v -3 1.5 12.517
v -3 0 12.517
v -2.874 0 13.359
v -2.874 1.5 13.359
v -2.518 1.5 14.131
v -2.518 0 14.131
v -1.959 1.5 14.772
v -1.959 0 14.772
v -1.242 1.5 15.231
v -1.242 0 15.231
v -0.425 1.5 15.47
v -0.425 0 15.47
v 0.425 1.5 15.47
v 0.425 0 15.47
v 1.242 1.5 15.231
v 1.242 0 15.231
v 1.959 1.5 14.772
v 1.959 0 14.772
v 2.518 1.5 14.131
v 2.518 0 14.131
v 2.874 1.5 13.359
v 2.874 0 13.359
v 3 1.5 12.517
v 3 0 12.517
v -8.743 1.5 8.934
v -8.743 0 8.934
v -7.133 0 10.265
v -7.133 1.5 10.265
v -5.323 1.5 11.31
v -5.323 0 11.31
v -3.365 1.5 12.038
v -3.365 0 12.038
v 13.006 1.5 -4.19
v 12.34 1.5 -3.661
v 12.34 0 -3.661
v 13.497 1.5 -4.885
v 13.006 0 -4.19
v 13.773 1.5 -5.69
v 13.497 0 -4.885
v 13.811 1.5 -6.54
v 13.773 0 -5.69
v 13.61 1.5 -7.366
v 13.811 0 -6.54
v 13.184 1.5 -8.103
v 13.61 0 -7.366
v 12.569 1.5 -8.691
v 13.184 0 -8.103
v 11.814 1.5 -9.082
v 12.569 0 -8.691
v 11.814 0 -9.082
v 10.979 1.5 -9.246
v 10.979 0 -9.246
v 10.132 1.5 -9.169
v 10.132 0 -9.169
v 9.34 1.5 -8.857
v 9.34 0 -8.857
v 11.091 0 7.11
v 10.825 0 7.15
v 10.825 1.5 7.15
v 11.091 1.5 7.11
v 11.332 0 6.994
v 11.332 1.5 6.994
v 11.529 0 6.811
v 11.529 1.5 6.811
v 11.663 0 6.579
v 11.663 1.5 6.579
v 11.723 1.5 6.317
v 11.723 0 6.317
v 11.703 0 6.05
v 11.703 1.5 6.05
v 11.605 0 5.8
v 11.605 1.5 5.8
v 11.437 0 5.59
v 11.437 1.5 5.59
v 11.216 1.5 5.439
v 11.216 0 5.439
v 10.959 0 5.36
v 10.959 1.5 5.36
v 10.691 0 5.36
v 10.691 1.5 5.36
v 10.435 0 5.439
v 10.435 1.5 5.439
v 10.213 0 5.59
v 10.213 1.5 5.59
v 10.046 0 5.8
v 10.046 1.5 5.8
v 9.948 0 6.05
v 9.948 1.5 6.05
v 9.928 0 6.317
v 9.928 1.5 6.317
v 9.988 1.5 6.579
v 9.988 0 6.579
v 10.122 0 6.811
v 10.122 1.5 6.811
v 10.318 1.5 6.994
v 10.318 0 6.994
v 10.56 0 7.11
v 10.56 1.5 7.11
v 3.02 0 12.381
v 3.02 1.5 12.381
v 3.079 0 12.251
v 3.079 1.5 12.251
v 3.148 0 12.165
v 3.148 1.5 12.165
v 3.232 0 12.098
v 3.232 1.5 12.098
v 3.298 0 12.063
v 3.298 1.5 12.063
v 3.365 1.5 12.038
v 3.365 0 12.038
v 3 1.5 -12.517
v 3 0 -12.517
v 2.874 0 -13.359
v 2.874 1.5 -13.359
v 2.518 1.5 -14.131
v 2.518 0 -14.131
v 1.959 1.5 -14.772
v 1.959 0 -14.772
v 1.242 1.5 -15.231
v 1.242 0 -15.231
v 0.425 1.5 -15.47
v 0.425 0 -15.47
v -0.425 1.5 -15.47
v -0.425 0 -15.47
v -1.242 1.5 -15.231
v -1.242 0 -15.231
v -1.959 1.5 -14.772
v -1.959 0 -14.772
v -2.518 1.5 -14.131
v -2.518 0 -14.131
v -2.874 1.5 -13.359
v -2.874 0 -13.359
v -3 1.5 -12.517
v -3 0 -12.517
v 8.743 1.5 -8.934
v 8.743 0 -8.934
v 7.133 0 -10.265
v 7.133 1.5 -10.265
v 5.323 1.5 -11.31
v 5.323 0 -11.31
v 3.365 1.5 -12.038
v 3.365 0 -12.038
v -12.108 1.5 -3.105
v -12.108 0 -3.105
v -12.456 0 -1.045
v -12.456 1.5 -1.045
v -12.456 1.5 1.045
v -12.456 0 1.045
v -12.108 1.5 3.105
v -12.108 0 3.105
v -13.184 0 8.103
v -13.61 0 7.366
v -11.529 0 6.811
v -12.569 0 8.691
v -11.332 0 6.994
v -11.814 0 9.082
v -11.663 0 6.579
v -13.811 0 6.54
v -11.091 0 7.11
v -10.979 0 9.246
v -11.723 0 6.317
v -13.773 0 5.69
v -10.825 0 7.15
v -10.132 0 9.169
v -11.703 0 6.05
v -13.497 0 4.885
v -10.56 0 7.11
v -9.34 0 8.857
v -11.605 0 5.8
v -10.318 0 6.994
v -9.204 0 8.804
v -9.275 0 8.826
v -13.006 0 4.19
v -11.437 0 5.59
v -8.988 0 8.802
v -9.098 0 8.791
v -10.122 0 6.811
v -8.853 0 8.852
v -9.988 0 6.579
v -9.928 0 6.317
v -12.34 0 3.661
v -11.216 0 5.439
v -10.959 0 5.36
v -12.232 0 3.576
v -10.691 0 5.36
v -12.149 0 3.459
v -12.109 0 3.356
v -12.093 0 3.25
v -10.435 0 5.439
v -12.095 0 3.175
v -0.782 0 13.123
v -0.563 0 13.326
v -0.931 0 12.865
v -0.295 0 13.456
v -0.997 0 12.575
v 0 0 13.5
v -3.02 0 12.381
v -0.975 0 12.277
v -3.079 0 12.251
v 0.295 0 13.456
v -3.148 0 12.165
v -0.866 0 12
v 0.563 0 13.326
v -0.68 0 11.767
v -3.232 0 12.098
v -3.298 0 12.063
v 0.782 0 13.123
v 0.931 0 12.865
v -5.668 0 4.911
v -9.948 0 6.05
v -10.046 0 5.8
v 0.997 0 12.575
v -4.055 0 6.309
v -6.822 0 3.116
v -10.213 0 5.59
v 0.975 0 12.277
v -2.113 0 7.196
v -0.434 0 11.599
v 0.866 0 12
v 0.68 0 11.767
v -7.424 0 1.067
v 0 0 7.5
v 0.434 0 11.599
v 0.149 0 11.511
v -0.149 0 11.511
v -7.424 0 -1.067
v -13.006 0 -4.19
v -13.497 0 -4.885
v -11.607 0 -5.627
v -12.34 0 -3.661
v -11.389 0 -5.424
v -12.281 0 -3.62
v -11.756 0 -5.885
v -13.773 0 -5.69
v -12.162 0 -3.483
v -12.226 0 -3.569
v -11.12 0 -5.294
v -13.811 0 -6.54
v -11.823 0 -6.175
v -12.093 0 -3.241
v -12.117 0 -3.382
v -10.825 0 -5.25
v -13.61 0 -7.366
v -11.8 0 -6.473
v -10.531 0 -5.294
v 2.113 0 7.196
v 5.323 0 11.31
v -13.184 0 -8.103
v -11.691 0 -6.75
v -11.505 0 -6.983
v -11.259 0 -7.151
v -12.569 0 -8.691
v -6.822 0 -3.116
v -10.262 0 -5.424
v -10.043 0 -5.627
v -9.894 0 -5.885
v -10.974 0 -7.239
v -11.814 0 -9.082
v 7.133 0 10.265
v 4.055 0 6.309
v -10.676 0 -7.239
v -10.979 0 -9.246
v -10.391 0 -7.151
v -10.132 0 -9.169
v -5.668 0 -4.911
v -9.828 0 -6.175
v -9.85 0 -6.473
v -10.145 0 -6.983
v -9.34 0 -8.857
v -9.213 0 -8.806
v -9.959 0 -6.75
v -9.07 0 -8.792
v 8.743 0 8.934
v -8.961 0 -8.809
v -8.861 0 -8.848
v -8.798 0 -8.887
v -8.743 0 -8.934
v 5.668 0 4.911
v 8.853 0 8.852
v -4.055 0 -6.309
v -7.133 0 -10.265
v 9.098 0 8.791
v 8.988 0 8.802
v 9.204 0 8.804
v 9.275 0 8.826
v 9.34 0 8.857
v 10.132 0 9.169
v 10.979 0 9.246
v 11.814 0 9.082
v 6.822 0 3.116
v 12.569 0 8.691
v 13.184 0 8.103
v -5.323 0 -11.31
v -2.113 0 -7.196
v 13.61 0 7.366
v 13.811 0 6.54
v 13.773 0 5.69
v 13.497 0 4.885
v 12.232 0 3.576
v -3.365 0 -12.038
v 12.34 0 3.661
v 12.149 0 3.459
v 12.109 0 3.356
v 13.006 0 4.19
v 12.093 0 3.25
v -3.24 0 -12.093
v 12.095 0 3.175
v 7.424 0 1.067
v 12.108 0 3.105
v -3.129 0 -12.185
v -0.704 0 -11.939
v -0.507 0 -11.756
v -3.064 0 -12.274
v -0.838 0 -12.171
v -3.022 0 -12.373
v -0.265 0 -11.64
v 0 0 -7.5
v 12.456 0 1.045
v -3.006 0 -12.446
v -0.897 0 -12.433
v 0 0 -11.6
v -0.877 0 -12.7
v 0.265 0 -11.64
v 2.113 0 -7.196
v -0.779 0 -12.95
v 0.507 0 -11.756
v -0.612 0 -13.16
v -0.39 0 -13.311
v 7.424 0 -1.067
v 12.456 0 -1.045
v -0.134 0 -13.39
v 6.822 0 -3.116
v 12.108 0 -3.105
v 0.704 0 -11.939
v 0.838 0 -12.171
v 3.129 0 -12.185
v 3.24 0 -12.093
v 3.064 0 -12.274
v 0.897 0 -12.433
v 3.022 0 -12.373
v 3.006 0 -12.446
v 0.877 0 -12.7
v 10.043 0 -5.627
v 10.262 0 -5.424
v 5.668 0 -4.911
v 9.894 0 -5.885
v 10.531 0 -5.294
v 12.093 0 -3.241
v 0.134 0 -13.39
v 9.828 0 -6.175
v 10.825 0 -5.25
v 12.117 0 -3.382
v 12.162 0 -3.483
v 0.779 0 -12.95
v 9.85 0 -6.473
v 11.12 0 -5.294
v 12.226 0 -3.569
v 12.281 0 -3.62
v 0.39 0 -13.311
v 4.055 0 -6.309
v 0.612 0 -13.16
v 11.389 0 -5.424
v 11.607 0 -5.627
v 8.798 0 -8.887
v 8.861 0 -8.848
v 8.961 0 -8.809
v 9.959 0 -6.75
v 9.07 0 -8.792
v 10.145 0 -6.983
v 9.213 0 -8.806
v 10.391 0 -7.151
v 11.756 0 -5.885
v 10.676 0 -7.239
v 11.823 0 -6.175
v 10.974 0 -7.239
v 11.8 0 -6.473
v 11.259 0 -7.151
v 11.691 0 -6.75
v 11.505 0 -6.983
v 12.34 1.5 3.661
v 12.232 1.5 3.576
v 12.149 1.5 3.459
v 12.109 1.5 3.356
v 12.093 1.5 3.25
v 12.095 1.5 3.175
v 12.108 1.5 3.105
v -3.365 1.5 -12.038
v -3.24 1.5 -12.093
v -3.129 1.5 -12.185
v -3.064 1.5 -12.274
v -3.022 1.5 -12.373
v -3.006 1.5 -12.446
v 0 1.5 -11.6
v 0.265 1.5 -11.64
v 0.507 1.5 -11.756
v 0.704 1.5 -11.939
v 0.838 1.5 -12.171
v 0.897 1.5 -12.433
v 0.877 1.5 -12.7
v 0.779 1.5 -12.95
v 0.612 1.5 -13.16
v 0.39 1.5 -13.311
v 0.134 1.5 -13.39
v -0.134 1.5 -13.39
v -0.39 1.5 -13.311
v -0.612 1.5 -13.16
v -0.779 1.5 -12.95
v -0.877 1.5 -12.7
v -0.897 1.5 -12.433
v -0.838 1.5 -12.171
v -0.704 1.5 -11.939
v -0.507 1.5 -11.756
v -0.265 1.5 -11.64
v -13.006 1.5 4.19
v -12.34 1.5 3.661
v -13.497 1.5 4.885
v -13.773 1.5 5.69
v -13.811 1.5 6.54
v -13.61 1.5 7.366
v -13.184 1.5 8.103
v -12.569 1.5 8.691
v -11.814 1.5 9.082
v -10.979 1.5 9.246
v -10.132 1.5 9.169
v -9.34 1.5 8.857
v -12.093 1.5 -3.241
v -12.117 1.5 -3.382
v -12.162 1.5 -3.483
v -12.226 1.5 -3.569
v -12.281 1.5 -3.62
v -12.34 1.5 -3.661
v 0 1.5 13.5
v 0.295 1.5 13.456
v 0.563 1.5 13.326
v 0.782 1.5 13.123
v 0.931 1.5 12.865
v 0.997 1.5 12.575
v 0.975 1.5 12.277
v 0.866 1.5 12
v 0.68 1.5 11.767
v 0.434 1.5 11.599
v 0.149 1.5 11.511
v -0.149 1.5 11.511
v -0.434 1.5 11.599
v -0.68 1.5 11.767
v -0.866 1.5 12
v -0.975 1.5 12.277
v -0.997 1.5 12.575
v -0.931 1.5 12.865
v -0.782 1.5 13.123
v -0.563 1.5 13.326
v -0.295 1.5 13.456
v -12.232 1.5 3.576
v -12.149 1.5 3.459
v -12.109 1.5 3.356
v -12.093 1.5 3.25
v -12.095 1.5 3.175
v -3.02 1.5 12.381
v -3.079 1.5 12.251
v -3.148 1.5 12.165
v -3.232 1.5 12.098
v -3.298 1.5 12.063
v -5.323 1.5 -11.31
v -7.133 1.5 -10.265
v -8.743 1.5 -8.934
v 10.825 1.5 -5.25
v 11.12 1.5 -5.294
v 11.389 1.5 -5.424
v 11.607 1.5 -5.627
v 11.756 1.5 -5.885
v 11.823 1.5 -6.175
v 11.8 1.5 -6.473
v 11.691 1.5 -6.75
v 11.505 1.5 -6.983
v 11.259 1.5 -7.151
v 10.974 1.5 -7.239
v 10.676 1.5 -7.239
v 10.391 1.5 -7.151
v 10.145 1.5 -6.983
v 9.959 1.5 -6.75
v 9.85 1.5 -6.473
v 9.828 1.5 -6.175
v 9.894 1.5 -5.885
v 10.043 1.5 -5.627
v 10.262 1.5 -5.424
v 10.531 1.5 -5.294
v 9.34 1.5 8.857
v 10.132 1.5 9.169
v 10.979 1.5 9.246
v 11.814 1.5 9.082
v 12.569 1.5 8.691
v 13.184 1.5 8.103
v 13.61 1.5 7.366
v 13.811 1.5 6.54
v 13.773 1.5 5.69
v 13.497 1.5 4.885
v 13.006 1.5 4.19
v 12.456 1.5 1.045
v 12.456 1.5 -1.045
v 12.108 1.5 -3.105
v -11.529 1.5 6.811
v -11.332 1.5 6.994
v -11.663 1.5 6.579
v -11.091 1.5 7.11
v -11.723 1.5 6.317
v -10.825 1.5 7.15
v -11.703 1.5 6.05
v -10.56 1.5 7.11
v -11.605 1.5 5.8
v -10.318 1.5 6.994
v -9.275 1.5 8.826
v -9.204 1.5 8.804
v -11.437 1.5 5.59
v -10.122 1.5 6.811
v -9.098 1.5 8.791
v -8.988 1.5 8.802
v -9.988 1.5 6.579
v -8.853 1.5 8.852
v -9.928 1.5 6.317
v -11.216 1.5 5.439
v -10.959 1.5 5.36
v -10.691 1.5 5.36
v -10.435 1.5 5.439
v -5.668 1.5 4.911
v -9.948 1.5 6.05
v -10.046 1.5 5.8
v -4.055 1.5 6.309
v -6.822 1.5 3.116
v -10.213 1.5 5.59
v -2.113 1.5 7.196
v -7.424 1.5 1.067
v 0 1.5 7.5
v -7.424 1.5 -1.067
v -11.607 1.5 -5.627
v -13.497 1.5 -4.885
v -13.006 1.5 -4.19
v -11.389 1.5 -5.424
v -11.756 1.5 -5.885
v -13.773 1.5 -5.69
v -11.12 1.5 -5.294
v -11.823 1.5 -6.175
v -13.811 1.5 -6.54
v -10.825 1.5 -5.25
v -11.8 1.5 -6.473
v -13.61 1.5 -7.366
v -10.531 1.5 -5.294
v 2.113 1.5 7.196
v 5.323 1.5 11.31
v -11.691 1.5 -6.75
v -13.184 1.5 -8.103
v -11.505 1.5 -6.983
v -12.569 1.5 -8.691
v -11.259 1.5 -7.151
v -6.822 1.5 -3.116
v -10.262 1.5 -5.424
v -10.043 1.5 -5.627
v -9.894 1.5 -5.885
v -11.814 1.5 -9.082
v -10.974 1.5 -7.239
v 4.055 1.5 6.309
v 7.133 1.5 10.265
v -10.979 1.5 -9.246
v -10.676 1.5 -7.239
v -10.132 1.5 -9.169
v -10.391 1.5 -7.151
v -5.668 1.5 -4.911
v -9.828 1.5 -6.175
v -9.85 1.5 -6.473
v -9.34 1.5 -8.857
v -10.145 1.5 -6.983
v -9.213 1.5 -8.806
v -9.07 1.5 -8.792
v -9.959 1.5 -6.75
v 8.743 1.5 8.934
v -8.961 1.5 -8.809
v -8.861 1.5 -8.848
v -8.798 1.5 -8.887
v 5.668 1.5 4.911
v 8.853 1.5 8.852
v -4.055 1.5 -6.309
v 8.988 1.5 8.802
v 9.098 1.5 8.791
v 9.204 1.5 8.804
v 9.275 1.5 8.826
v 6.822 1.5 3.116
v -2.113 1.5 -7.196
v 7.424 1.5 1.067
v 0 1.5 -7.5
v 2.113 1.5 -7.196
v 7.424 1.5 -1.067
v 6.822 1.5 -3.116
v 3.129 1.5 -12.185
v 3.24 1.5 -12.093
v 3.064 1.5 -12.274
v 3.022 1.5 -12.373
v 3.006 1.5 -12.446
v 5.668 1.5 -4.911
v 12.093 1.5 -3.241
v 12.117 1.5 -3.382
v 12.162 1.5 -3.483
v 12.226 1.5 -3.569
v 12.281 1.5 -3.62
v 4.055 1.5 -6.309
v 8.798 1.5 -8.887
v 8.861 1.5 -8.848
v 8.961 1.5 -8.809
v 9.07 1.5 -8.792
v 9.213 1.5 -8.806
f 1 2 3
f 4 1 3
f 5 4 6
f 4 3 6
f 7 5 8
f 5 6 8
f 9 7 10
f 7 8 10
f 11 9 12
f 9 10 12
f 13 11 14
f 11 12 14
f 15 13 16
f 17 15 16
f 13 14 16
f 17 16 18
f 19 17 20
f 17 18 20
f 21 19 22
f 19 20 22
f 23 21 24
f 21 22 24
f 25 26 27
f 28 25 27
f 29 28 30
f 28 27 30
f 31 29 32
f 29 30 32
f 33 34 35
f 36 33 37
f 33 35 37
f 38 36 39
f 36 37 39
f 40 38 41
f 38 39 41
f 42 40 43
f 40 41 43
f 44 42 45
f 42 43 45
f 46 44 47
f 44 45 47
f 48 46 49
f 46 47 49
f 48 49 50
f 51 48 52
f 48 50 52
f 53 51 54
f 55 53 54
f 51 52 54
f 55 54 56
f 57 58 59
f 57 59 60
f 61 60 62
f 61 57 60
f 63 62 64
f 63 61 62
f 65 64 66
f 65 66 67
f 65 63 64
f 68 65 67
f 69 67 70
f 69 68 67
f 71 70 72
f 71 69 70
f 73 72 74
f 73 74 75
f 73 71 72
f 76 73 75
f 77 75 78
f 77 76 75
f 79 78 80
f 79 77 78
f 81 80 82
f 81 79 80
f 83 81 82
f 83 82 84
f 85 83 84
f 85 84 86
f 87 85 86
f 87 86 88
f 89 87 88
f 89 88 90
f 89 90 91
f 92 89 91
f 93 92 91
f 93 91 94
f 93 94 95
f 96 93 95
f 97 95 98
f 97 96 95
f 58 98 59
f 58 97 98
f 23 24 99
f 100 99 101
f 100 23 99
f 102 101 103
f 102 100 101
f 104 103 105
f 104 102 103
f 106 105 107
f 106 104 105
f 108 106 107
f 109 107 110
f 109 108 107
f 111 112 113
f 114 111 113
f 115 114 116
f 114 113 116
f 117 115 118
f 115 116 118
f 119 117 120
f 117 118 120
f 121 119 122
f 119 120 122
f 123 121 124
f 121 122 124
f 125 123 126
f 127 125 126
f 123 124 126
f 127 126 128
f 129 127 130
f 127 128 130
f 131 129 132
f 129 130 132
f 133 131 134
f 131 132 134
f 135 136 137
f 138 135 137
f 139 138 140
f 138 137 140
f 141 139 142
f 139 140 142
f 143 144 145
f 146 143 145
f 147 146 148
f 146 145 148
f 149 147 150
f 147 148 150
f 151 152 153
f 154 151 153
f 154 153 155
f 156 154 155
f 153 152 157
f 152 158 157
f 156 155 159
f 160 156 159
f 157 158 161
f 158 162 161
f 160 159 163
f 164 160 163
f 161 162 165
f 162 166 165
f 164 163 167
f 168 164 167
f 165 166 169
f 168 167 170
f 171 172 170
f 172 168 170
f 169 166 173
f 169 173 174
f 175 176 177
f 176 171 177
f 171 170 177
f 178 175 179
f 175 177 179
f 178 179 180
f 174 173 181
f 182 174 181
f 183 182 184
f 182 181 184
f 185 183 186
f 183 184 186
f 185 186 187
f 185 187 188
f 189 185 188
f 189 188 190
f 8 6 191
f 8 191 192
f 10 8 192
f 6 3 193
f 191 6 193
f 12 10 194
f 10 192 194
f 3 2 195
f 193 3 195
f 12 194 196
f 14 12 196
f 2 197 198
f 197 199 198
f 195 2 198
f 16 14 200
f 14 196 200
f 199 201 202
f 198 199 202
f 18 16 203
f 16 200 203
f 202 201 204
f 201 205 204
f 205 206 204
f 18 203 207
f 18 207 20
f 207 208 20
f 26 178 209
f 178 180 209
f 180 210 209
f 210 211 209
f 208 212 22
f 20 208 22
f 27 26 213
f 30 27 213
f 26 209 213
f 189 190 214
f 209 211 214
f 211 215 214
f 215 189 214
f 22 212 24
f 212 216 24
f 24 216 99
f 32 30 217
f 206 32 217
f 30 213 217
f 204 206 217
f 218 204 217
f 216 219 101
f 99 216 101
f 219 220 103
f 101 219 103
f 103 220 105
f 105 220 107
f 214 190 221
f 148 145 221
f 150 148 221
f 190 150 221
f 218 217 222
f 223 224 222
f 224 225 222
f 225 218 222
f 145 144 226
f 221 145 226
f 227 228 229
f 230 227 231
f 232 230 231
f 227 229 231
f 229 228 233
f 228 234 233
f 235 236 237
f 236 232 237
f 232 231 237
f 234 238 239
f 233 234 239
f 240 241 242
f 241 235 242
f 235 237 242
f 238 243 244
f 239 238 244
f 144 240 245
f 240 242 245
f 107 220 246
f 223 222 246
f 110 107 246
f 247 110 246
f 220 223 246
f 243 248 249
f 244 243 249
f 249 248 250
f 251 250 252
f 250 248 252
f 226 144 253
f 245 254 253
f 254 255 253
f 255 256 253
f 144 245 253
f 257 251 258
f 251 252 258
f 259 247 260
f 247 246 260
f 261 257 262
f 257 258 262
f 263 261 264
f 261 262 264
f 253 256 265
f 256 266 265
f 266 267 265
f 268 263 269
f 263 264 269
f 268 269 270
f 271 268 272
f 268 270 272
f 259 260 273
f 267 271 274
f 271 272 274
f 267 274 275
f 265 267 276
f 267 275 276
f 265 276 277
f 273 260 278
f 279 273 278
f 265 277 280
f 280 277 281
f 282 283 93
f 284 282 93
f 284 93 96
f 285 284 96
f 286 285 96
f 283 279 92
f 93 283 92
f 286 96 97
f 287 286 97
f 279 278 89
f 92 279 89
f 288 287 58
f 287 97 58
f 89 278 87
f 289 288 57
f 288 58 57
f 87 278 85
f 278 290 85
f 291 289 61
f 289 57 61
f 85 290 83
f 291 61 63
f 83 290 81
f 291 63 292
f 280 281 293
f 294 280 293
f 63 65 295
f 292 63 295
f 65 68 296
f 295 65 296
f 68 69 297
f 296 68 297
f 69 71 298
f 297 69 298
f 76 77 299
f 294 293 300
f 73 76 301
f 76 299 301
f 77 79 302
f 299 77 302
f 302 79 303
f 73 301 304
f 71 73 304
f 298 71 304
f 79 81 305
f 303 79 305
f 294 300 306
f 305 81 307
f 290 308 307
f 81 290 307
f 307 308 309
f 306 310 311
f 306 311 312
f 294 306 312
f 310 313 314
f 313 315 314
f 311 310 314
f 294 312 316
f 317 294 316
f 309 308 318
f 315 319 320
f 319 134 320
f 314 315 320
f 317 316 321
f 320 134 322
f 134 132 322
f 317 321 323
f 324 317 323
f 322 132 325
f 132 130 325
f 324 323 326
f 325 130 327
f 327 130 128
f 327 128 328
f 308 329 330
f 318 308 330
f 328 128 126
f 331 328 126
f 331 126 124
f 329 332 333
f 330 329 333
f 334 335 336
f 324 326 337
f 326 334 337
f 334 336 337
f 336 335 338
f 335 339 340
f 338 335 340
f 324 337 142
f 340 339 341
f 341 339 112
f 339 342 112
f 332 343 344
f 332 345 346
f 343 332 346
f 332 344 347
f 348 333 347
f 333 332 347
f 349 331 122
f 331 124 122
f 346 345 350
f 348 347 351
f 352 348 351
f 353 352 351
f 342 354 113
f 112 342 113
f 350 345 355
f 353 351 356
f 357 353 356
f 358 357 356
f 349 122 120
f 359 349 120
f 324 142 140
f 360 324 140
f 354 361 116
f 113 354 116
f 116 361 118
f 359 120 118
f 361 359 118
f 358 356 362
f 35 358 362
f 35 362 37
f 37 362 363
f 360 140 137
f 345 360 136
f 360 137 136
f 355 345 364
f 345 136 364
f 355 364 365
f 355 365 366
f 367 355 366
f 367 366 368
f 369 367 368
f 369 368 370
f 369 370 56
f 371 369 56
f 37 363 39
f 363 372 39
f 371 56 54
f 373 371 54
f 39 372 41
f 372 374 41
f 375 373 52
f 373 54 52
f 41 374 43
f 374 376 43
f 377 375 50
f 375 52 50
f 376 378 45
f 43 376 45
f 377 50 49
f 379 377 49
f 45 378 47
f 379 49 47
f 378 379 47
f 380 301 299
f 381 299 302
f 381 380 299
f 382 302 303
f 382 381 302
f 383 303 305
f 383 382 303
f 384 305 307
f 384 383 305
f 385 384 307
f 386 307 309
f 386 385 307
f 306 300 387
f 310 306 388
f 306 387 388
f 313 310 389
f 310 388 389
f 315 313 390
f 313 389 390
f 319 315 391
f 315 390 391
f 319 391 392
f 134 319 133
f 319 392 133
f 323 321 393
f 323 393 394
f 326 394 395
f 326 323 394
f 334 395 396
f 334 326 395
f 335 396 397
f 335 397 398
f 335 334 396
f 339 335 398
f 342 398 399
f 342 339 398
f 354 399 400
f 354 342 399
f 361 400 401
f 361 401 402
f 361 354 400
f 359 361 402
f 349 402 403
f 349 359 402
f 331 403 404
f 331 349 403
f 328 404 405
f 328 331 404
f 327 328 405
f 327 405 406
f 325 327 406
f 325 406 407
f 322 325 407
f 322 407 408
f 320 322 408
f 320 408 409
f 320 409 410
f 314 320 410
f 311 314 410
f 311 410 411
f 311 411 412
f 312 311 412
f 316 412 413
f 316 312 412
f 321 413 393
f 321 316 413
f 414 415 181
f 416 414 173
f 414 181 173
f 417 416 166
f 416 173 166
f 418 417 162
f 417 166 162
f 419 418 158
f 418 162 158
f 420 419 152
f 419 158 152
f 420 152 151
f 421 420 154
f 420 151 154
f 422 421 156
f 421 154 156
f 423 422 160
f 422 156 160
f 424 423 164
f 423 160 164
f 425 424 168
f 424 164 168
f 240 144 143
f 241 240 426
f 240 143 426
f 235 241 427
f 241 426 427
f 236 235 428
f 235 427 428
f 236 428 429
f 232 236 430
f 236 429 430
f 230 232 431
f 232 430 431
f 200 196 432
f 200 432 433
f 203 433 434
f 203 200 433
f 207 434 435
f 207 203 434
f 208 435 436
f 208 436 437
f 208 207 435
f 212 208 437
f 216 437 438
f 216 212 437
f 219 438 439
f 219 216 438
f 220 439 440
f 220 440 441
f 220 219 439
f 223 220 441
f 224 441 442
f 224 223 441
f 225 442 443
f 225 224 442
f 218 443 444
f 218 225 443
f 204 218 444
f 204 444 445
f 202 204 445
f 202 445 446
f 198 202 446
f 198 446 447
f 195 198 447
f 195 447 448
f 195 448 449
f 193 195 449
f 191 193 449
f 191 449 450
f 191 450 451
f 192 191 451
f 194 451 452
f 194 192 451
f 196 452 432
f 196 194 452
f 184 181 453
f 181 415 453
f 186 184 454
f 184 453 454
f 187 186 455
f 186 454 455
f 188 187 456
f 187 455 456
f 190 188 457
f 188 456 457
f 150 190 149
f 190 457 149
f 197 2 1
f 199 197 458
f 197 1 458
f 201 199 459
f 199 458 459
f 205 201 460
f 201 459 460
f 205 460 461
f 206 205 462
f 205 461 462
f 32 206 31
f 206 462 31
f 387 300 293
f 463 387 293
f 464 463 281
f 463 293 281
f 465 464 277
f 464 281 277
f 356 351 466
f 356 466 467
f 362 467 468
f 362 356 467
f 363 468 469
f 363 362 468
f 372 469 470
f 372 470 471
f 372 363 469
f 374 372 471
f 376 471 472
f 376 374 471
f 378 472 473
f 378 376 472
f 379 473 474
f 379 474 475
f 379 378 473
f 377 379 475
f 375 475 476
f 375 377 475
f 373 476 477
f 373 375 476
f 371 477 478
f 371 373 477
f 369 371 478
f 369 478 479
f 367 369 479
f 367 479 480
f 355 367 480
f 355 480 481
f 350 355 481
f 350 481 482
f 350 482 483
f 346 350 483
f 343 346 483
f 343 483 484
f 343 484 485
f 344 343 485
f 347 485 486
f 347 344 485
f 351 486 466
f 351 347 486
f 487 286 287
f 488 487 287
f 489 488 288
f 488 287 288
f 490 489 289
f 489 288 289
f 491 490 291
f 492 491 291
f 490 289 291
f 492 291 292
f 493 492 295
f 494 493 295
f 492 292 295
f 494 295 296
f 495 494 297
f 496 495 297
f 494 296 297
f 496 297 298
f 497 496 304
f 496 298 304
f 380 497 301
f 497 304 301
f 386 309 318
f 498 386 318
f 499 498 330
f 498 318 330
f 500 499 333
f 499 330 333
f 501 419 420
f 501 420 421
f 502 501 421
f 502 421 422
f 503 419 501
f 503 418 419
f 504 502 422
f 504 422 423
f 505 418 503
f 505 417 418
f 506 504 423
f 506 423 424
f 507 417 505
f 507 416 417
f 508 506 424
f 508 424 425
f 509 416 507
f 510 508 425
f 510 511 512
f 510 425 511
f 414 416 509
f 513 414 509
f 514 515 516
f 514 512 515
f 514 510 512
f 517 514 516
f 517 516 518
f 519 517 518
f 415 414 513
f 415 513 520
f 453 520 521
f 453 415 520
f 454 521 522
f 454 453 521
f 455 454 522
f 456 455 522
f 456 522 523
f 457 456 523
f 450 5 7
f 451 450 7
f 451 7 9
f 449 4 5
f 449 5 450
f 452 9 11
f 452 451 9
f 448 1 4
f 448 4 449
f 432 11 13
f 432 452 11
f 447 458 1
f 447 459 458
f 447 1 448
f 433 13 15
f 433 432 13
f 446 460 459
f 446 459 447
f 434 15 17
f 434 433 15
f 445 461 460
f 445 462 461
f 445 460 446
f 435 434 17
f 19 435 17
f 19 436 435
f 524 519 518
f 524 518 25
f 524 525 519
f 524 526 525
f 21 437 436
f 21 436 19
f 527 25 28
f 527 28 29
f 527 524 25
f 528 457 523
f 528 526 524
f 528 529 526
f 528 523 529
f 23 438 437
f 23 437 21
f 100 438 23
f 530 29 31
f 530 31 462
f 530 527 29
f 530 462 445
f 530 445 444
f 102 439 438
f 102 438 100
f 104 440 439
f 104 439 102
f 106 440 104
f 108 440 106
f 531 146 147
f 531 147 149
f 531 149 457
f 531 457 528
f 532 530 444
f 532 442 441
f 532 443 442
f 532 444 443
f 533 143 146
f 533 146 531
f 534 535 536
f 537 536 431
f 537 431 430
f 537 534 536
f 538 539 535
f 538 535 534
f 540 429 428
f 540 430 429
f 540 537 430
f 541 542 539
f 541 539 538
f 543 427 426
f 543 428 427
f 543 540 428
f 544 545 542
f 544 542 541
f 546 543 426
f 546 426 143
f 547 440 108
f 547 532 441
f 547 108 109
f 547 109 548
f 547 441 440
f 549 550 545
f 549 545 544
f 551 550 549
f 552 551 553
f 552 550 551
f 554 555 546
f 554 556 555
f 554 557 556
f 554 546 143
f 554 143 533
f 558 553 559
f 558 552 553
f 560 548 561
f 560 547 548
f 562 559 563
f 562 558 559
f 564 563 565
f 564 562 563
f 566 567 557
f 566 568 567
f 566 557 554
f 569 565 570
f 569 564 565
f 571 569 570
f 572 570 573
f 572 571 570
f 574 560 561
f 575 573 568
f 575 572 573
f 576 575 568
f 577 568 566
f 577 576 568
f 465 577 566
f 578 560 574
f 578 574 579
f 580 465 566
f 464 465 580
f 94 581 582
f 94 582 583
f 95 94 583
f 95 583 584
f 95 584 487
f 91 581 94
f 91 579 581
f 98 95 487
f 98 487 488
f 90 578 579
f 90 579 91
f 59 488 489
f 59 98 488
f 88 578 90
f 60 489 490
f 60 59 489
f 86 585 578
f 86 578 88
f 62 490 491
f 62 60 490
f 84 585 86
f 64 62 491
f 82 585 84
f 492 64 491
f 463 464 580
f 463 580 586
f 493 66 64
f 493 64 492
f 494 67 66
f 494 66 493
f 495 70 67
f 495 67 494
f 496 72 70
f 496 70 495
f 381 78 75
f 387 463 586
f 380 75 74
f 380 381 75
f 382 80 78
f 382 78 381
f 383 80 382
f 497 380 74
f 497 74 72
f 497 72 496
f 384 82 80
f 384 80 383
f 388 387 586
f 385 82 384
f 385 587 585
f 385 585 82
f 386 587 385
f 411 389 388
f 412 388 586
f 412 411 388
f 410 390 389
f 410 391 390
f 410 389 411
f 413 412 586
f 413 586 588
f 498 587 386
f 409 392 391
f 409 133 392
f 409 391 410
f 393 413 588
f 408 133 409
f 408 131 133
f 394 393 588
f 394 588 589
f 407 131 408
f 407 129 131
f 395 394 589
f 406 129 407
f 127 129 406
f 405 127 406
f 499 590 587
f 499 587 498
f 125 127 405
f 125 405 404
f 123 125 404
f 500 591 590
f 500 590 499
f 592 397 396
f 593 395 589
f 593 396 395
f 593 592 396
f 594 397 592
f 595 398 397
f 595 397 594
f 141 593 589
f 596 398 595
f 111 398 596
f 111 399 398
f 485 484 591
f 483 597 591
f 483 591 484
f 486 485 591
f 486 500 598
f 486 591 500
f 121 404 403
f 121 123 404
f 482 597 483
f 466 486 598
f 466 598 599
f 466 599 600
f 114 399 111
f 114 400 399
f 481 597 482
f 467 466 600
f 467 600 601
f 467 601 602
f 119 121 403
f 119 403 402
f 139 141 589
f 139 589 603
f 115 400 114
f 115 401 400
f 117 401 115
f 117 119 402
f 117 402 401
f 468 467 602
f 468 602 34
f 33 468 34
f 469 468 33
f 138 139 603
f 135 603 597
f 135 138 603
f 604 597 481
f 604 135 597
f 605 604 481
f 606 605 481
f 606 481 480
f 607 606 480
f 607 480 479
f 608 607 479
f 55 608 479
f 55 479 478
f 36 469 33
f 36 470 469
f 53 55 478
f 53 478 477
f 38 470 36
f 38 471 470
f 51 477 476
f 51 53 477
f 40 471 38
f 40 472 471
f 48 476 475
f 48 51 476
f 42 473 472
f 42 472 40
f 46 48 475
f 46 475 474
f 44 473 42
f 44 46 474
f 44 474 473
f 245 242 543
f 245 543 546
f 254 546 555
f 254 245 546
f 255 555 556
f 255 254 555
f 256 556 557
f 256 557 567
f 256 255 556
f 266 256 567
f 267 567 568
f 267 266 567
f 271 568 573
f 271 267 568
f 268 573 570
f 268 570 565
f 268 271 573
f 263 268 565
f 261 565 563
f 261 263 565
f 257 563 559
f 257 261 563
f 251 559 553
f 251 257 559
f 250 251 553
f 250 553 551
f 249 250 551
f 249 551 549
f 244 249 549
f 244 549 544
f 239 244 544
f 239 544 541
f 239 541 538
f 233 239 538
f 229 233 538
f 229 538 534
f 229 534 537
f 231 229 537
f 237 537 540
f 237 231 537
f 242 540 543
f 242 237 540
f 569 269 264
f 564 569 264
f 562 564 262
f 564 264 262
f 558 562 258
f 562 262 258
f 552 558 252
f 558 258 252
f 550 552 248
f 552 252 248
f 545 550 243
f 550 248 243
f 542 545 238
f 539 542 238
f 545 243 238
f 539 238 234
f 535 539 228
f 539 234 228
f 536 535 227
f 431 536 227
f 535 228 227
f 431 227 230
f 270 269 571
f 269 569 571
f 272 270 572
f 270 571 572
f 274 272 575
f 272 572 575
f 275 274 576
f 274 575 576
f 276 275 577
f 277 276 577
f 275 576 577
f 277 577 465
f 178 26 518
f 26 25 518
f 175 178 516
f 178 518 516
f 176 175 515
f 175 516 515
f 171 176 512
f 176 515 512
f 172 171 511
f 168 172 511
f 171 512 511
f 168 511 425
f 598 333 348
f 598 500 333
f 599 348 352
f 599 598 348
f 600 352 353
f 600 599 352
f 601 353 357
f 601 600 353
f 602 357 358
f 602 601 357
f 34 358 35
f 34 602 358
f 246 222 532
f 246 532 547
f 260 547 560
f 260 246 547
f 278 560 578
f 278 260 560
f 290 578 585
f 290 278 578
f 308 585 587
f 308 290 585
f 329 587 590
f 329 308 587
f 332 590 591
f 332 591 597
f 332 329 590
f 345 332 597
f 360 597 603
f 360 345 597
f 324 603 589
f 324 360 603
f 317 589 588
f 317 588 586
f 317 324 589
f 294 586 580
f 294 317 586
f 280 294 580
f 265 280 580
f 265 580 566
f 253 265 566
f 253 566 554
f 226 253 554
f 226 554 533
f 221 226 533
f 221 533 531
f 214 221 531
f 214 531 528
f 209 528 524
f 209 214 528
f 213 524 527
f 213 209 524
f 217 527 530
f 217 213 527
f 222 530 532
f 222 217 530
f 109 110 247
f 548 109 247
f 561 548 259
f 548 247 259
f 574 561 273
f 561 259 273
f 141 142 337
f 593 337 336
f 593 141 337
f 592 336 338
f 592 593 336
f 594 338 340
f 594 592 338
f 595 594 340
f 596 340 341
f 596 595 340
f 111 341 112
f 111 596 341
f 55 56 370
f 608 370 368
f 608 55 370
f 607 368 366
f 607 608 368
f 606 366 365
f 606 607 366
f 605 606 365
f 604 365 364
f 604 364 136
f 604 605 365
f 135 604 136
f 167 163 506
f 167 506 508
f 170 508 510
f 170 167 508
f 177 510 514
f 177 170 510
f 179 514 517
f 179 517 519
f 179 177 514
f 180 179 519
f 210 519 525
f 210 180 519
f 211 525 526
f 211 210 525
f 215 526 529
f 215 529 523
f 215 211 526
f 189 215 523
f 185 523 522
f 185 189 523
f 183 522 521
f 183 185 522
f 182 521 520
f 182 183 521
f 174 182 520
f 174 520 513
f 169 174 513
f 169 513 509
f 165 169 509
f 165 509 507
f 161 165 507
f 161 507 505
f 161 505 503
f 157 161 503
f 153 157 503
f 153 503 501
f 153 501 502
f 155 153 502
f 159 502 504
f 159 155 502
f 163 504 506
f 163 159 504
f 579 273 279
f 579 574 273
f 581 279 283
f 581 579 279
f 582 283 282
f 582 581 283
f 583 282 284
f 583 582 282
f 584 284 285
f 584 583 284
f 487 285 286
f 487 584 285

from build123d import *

# Parameters (mm, degrees)
SKETCH1_R           = 0.9
SKETCH1_R_2         = 7.5
SKETCH1_R_3         = 1
BOSS_EXTRUDE1_DEPTH = 1.5
FILLET1_R           = 0.5


with BuildPart() as part:
    # Sketch1 → Boss-Extrude1 (new body)
    with BuildSketch(Plane(origin=(0, 0, 0), x_dir=(1, 0, 0), z_dir=(0, 1, 0))):
        with BuildLine():
            Line((-3, -12.1346611), (-3, -12.5))
            ThreePointArc((-3, -12.5), (0, -15.5), (3, -12.5))
            Line((3, -12.5), (3, -12.1346611))
            ThreePointArc((3, -12.1346611), (6.25, -10.825317547), (9.008924778, -8.665406761))
            Line((9.008924778, -8.665406761), (9.325317547, -8.848076211))
            ThreePointArc((9.325317547, -8.848076211), (13.423393759, -7.75), (12.325317547, -3.651923789))
            Line((12.325317547, -3.651923789), (12.008924778, -3.469254338))
            ThreePointArc((12.008924778, -3.469254338), (12.5, 0), (12.008924778, 3.469254338))
            Line((12.008924778, 3.469254338), (12.325317547, 3.651923789))
            ThreePointArc((12.325317547, 3.651923789), (13.423393759, 7.75), (9.325317547, 8.848076211))
            Line((9.325317547, 8.848076211), (9.008924778, 8.665406761))
            ThreePointArc((9.008924778, 8.665406761), (6.25, 10.825317547), (3, 12.1346611))
            Line((3, 12.1346611), (3, 12.5))
            ThreePointArc((3, 12.5), (0, 15.5), (-3, 12.5))
            Line((-3, 12.5), (-3, 12.1346611))
            ThreePointArc((-3, 12.1346611), (-6.25, 10.825317547), (-9.008924778, 8.665406761))
            Line((-9.008924778, 8.665406761), (-9.325317547, 8.848076211))
            ThreePointArc((-9.325317547, 8.848076211), (-13.423393759, 7.75), (-12.325317547, 3.651923789))
            Line((-12.325317547, 3.651923789), (-12.008924778, 3.469254338))
            ThreePointArc((-12.008924778, 3.469254338), (-12.5, 0), (-12.008924778, -3.469254338))
            Line((-12.008924778, -3.469254338), (-12.325317547, -3.651923789))
            ThreePointArc((-12.325317547, -3.651923789), (-13.423393759, -7.75), (-9.325317547, -8.848076211))
            Line((-9.325317547, -8.848076211), (-9.008924778, -8.665406761))
            ThreePointArc((-9.008924778, -8.665406761), (-6.25, -10.825317547), (-3, -12.1346611))
        make_face()
        with Locations(Location((-10.825317547, -6.25, 0), (0, 0, 270))):
            Circle(SKETCH1_R, mode=Mode.SUBTRACT)
        with Locations(Location((0, 0, 0), (0, 0, 270))):
            Circle(SKETCH1_R_2, mode=Mode.SUBTRACT)
        with Locations(Location((-10.825317547, 6.25, 0), (0, 0, 270))):
            Circle(SKETCH1_R_3, mode=Mode.SUBTRACT)
        with Locations(Location((0, 12.5, 0), (0, 0, 270))):
            Circle(SKETCH1_R, mode=Mode.SUBTRACT)
        with Locations(Location((10.825317547, 6.25, 0), (0, 0, 270))):
            Circle(SKETCH1_R_3, mode=Mode.SUBTRACT)
        with Locations(Location((10.825317547, -6.25, 0), (0, 0, 270))):
            Circle(SKETCH1_R, mode=Mode.SUBTRACT)
        with Locations(Location((0, -12.5, 0), (0, 0, 270))):
            Circle(SKETCH1_R_3, mode=Mode.SUBTRACT)
    extrude(amount=BOSS_EXTRUDE1_DEPTH)

    # Fillet1
    fillet1_edges = [part.edges().sort_by_distance(p)[0] for p in [
        (-3, 0.75, 12.1346611),
        (3, 0.75, 12.1346611),
        (9.008924778, 0.75, 8.665406761),
        (12.008924778, 0.75, 3.469254338),
        (12.008924778, 0.75, -3.469254338),
        (9.008924778, 0.75, -8.665406761),
        (3, 0.75, -12.1346611),
        (-3, 0.75, -12.1346611),
        (-9.008924778, 0.75, -8.665406761),
        (-12.008924778, 0.75, -3.469254338),
        (-12.008924778, 0.75, 3.469254338),
        (-9.008924778, 0.75, 8.665406761),
    ]]
    fillet(fillet1_edges, radius=FILLET1_R)


solid = part.part
